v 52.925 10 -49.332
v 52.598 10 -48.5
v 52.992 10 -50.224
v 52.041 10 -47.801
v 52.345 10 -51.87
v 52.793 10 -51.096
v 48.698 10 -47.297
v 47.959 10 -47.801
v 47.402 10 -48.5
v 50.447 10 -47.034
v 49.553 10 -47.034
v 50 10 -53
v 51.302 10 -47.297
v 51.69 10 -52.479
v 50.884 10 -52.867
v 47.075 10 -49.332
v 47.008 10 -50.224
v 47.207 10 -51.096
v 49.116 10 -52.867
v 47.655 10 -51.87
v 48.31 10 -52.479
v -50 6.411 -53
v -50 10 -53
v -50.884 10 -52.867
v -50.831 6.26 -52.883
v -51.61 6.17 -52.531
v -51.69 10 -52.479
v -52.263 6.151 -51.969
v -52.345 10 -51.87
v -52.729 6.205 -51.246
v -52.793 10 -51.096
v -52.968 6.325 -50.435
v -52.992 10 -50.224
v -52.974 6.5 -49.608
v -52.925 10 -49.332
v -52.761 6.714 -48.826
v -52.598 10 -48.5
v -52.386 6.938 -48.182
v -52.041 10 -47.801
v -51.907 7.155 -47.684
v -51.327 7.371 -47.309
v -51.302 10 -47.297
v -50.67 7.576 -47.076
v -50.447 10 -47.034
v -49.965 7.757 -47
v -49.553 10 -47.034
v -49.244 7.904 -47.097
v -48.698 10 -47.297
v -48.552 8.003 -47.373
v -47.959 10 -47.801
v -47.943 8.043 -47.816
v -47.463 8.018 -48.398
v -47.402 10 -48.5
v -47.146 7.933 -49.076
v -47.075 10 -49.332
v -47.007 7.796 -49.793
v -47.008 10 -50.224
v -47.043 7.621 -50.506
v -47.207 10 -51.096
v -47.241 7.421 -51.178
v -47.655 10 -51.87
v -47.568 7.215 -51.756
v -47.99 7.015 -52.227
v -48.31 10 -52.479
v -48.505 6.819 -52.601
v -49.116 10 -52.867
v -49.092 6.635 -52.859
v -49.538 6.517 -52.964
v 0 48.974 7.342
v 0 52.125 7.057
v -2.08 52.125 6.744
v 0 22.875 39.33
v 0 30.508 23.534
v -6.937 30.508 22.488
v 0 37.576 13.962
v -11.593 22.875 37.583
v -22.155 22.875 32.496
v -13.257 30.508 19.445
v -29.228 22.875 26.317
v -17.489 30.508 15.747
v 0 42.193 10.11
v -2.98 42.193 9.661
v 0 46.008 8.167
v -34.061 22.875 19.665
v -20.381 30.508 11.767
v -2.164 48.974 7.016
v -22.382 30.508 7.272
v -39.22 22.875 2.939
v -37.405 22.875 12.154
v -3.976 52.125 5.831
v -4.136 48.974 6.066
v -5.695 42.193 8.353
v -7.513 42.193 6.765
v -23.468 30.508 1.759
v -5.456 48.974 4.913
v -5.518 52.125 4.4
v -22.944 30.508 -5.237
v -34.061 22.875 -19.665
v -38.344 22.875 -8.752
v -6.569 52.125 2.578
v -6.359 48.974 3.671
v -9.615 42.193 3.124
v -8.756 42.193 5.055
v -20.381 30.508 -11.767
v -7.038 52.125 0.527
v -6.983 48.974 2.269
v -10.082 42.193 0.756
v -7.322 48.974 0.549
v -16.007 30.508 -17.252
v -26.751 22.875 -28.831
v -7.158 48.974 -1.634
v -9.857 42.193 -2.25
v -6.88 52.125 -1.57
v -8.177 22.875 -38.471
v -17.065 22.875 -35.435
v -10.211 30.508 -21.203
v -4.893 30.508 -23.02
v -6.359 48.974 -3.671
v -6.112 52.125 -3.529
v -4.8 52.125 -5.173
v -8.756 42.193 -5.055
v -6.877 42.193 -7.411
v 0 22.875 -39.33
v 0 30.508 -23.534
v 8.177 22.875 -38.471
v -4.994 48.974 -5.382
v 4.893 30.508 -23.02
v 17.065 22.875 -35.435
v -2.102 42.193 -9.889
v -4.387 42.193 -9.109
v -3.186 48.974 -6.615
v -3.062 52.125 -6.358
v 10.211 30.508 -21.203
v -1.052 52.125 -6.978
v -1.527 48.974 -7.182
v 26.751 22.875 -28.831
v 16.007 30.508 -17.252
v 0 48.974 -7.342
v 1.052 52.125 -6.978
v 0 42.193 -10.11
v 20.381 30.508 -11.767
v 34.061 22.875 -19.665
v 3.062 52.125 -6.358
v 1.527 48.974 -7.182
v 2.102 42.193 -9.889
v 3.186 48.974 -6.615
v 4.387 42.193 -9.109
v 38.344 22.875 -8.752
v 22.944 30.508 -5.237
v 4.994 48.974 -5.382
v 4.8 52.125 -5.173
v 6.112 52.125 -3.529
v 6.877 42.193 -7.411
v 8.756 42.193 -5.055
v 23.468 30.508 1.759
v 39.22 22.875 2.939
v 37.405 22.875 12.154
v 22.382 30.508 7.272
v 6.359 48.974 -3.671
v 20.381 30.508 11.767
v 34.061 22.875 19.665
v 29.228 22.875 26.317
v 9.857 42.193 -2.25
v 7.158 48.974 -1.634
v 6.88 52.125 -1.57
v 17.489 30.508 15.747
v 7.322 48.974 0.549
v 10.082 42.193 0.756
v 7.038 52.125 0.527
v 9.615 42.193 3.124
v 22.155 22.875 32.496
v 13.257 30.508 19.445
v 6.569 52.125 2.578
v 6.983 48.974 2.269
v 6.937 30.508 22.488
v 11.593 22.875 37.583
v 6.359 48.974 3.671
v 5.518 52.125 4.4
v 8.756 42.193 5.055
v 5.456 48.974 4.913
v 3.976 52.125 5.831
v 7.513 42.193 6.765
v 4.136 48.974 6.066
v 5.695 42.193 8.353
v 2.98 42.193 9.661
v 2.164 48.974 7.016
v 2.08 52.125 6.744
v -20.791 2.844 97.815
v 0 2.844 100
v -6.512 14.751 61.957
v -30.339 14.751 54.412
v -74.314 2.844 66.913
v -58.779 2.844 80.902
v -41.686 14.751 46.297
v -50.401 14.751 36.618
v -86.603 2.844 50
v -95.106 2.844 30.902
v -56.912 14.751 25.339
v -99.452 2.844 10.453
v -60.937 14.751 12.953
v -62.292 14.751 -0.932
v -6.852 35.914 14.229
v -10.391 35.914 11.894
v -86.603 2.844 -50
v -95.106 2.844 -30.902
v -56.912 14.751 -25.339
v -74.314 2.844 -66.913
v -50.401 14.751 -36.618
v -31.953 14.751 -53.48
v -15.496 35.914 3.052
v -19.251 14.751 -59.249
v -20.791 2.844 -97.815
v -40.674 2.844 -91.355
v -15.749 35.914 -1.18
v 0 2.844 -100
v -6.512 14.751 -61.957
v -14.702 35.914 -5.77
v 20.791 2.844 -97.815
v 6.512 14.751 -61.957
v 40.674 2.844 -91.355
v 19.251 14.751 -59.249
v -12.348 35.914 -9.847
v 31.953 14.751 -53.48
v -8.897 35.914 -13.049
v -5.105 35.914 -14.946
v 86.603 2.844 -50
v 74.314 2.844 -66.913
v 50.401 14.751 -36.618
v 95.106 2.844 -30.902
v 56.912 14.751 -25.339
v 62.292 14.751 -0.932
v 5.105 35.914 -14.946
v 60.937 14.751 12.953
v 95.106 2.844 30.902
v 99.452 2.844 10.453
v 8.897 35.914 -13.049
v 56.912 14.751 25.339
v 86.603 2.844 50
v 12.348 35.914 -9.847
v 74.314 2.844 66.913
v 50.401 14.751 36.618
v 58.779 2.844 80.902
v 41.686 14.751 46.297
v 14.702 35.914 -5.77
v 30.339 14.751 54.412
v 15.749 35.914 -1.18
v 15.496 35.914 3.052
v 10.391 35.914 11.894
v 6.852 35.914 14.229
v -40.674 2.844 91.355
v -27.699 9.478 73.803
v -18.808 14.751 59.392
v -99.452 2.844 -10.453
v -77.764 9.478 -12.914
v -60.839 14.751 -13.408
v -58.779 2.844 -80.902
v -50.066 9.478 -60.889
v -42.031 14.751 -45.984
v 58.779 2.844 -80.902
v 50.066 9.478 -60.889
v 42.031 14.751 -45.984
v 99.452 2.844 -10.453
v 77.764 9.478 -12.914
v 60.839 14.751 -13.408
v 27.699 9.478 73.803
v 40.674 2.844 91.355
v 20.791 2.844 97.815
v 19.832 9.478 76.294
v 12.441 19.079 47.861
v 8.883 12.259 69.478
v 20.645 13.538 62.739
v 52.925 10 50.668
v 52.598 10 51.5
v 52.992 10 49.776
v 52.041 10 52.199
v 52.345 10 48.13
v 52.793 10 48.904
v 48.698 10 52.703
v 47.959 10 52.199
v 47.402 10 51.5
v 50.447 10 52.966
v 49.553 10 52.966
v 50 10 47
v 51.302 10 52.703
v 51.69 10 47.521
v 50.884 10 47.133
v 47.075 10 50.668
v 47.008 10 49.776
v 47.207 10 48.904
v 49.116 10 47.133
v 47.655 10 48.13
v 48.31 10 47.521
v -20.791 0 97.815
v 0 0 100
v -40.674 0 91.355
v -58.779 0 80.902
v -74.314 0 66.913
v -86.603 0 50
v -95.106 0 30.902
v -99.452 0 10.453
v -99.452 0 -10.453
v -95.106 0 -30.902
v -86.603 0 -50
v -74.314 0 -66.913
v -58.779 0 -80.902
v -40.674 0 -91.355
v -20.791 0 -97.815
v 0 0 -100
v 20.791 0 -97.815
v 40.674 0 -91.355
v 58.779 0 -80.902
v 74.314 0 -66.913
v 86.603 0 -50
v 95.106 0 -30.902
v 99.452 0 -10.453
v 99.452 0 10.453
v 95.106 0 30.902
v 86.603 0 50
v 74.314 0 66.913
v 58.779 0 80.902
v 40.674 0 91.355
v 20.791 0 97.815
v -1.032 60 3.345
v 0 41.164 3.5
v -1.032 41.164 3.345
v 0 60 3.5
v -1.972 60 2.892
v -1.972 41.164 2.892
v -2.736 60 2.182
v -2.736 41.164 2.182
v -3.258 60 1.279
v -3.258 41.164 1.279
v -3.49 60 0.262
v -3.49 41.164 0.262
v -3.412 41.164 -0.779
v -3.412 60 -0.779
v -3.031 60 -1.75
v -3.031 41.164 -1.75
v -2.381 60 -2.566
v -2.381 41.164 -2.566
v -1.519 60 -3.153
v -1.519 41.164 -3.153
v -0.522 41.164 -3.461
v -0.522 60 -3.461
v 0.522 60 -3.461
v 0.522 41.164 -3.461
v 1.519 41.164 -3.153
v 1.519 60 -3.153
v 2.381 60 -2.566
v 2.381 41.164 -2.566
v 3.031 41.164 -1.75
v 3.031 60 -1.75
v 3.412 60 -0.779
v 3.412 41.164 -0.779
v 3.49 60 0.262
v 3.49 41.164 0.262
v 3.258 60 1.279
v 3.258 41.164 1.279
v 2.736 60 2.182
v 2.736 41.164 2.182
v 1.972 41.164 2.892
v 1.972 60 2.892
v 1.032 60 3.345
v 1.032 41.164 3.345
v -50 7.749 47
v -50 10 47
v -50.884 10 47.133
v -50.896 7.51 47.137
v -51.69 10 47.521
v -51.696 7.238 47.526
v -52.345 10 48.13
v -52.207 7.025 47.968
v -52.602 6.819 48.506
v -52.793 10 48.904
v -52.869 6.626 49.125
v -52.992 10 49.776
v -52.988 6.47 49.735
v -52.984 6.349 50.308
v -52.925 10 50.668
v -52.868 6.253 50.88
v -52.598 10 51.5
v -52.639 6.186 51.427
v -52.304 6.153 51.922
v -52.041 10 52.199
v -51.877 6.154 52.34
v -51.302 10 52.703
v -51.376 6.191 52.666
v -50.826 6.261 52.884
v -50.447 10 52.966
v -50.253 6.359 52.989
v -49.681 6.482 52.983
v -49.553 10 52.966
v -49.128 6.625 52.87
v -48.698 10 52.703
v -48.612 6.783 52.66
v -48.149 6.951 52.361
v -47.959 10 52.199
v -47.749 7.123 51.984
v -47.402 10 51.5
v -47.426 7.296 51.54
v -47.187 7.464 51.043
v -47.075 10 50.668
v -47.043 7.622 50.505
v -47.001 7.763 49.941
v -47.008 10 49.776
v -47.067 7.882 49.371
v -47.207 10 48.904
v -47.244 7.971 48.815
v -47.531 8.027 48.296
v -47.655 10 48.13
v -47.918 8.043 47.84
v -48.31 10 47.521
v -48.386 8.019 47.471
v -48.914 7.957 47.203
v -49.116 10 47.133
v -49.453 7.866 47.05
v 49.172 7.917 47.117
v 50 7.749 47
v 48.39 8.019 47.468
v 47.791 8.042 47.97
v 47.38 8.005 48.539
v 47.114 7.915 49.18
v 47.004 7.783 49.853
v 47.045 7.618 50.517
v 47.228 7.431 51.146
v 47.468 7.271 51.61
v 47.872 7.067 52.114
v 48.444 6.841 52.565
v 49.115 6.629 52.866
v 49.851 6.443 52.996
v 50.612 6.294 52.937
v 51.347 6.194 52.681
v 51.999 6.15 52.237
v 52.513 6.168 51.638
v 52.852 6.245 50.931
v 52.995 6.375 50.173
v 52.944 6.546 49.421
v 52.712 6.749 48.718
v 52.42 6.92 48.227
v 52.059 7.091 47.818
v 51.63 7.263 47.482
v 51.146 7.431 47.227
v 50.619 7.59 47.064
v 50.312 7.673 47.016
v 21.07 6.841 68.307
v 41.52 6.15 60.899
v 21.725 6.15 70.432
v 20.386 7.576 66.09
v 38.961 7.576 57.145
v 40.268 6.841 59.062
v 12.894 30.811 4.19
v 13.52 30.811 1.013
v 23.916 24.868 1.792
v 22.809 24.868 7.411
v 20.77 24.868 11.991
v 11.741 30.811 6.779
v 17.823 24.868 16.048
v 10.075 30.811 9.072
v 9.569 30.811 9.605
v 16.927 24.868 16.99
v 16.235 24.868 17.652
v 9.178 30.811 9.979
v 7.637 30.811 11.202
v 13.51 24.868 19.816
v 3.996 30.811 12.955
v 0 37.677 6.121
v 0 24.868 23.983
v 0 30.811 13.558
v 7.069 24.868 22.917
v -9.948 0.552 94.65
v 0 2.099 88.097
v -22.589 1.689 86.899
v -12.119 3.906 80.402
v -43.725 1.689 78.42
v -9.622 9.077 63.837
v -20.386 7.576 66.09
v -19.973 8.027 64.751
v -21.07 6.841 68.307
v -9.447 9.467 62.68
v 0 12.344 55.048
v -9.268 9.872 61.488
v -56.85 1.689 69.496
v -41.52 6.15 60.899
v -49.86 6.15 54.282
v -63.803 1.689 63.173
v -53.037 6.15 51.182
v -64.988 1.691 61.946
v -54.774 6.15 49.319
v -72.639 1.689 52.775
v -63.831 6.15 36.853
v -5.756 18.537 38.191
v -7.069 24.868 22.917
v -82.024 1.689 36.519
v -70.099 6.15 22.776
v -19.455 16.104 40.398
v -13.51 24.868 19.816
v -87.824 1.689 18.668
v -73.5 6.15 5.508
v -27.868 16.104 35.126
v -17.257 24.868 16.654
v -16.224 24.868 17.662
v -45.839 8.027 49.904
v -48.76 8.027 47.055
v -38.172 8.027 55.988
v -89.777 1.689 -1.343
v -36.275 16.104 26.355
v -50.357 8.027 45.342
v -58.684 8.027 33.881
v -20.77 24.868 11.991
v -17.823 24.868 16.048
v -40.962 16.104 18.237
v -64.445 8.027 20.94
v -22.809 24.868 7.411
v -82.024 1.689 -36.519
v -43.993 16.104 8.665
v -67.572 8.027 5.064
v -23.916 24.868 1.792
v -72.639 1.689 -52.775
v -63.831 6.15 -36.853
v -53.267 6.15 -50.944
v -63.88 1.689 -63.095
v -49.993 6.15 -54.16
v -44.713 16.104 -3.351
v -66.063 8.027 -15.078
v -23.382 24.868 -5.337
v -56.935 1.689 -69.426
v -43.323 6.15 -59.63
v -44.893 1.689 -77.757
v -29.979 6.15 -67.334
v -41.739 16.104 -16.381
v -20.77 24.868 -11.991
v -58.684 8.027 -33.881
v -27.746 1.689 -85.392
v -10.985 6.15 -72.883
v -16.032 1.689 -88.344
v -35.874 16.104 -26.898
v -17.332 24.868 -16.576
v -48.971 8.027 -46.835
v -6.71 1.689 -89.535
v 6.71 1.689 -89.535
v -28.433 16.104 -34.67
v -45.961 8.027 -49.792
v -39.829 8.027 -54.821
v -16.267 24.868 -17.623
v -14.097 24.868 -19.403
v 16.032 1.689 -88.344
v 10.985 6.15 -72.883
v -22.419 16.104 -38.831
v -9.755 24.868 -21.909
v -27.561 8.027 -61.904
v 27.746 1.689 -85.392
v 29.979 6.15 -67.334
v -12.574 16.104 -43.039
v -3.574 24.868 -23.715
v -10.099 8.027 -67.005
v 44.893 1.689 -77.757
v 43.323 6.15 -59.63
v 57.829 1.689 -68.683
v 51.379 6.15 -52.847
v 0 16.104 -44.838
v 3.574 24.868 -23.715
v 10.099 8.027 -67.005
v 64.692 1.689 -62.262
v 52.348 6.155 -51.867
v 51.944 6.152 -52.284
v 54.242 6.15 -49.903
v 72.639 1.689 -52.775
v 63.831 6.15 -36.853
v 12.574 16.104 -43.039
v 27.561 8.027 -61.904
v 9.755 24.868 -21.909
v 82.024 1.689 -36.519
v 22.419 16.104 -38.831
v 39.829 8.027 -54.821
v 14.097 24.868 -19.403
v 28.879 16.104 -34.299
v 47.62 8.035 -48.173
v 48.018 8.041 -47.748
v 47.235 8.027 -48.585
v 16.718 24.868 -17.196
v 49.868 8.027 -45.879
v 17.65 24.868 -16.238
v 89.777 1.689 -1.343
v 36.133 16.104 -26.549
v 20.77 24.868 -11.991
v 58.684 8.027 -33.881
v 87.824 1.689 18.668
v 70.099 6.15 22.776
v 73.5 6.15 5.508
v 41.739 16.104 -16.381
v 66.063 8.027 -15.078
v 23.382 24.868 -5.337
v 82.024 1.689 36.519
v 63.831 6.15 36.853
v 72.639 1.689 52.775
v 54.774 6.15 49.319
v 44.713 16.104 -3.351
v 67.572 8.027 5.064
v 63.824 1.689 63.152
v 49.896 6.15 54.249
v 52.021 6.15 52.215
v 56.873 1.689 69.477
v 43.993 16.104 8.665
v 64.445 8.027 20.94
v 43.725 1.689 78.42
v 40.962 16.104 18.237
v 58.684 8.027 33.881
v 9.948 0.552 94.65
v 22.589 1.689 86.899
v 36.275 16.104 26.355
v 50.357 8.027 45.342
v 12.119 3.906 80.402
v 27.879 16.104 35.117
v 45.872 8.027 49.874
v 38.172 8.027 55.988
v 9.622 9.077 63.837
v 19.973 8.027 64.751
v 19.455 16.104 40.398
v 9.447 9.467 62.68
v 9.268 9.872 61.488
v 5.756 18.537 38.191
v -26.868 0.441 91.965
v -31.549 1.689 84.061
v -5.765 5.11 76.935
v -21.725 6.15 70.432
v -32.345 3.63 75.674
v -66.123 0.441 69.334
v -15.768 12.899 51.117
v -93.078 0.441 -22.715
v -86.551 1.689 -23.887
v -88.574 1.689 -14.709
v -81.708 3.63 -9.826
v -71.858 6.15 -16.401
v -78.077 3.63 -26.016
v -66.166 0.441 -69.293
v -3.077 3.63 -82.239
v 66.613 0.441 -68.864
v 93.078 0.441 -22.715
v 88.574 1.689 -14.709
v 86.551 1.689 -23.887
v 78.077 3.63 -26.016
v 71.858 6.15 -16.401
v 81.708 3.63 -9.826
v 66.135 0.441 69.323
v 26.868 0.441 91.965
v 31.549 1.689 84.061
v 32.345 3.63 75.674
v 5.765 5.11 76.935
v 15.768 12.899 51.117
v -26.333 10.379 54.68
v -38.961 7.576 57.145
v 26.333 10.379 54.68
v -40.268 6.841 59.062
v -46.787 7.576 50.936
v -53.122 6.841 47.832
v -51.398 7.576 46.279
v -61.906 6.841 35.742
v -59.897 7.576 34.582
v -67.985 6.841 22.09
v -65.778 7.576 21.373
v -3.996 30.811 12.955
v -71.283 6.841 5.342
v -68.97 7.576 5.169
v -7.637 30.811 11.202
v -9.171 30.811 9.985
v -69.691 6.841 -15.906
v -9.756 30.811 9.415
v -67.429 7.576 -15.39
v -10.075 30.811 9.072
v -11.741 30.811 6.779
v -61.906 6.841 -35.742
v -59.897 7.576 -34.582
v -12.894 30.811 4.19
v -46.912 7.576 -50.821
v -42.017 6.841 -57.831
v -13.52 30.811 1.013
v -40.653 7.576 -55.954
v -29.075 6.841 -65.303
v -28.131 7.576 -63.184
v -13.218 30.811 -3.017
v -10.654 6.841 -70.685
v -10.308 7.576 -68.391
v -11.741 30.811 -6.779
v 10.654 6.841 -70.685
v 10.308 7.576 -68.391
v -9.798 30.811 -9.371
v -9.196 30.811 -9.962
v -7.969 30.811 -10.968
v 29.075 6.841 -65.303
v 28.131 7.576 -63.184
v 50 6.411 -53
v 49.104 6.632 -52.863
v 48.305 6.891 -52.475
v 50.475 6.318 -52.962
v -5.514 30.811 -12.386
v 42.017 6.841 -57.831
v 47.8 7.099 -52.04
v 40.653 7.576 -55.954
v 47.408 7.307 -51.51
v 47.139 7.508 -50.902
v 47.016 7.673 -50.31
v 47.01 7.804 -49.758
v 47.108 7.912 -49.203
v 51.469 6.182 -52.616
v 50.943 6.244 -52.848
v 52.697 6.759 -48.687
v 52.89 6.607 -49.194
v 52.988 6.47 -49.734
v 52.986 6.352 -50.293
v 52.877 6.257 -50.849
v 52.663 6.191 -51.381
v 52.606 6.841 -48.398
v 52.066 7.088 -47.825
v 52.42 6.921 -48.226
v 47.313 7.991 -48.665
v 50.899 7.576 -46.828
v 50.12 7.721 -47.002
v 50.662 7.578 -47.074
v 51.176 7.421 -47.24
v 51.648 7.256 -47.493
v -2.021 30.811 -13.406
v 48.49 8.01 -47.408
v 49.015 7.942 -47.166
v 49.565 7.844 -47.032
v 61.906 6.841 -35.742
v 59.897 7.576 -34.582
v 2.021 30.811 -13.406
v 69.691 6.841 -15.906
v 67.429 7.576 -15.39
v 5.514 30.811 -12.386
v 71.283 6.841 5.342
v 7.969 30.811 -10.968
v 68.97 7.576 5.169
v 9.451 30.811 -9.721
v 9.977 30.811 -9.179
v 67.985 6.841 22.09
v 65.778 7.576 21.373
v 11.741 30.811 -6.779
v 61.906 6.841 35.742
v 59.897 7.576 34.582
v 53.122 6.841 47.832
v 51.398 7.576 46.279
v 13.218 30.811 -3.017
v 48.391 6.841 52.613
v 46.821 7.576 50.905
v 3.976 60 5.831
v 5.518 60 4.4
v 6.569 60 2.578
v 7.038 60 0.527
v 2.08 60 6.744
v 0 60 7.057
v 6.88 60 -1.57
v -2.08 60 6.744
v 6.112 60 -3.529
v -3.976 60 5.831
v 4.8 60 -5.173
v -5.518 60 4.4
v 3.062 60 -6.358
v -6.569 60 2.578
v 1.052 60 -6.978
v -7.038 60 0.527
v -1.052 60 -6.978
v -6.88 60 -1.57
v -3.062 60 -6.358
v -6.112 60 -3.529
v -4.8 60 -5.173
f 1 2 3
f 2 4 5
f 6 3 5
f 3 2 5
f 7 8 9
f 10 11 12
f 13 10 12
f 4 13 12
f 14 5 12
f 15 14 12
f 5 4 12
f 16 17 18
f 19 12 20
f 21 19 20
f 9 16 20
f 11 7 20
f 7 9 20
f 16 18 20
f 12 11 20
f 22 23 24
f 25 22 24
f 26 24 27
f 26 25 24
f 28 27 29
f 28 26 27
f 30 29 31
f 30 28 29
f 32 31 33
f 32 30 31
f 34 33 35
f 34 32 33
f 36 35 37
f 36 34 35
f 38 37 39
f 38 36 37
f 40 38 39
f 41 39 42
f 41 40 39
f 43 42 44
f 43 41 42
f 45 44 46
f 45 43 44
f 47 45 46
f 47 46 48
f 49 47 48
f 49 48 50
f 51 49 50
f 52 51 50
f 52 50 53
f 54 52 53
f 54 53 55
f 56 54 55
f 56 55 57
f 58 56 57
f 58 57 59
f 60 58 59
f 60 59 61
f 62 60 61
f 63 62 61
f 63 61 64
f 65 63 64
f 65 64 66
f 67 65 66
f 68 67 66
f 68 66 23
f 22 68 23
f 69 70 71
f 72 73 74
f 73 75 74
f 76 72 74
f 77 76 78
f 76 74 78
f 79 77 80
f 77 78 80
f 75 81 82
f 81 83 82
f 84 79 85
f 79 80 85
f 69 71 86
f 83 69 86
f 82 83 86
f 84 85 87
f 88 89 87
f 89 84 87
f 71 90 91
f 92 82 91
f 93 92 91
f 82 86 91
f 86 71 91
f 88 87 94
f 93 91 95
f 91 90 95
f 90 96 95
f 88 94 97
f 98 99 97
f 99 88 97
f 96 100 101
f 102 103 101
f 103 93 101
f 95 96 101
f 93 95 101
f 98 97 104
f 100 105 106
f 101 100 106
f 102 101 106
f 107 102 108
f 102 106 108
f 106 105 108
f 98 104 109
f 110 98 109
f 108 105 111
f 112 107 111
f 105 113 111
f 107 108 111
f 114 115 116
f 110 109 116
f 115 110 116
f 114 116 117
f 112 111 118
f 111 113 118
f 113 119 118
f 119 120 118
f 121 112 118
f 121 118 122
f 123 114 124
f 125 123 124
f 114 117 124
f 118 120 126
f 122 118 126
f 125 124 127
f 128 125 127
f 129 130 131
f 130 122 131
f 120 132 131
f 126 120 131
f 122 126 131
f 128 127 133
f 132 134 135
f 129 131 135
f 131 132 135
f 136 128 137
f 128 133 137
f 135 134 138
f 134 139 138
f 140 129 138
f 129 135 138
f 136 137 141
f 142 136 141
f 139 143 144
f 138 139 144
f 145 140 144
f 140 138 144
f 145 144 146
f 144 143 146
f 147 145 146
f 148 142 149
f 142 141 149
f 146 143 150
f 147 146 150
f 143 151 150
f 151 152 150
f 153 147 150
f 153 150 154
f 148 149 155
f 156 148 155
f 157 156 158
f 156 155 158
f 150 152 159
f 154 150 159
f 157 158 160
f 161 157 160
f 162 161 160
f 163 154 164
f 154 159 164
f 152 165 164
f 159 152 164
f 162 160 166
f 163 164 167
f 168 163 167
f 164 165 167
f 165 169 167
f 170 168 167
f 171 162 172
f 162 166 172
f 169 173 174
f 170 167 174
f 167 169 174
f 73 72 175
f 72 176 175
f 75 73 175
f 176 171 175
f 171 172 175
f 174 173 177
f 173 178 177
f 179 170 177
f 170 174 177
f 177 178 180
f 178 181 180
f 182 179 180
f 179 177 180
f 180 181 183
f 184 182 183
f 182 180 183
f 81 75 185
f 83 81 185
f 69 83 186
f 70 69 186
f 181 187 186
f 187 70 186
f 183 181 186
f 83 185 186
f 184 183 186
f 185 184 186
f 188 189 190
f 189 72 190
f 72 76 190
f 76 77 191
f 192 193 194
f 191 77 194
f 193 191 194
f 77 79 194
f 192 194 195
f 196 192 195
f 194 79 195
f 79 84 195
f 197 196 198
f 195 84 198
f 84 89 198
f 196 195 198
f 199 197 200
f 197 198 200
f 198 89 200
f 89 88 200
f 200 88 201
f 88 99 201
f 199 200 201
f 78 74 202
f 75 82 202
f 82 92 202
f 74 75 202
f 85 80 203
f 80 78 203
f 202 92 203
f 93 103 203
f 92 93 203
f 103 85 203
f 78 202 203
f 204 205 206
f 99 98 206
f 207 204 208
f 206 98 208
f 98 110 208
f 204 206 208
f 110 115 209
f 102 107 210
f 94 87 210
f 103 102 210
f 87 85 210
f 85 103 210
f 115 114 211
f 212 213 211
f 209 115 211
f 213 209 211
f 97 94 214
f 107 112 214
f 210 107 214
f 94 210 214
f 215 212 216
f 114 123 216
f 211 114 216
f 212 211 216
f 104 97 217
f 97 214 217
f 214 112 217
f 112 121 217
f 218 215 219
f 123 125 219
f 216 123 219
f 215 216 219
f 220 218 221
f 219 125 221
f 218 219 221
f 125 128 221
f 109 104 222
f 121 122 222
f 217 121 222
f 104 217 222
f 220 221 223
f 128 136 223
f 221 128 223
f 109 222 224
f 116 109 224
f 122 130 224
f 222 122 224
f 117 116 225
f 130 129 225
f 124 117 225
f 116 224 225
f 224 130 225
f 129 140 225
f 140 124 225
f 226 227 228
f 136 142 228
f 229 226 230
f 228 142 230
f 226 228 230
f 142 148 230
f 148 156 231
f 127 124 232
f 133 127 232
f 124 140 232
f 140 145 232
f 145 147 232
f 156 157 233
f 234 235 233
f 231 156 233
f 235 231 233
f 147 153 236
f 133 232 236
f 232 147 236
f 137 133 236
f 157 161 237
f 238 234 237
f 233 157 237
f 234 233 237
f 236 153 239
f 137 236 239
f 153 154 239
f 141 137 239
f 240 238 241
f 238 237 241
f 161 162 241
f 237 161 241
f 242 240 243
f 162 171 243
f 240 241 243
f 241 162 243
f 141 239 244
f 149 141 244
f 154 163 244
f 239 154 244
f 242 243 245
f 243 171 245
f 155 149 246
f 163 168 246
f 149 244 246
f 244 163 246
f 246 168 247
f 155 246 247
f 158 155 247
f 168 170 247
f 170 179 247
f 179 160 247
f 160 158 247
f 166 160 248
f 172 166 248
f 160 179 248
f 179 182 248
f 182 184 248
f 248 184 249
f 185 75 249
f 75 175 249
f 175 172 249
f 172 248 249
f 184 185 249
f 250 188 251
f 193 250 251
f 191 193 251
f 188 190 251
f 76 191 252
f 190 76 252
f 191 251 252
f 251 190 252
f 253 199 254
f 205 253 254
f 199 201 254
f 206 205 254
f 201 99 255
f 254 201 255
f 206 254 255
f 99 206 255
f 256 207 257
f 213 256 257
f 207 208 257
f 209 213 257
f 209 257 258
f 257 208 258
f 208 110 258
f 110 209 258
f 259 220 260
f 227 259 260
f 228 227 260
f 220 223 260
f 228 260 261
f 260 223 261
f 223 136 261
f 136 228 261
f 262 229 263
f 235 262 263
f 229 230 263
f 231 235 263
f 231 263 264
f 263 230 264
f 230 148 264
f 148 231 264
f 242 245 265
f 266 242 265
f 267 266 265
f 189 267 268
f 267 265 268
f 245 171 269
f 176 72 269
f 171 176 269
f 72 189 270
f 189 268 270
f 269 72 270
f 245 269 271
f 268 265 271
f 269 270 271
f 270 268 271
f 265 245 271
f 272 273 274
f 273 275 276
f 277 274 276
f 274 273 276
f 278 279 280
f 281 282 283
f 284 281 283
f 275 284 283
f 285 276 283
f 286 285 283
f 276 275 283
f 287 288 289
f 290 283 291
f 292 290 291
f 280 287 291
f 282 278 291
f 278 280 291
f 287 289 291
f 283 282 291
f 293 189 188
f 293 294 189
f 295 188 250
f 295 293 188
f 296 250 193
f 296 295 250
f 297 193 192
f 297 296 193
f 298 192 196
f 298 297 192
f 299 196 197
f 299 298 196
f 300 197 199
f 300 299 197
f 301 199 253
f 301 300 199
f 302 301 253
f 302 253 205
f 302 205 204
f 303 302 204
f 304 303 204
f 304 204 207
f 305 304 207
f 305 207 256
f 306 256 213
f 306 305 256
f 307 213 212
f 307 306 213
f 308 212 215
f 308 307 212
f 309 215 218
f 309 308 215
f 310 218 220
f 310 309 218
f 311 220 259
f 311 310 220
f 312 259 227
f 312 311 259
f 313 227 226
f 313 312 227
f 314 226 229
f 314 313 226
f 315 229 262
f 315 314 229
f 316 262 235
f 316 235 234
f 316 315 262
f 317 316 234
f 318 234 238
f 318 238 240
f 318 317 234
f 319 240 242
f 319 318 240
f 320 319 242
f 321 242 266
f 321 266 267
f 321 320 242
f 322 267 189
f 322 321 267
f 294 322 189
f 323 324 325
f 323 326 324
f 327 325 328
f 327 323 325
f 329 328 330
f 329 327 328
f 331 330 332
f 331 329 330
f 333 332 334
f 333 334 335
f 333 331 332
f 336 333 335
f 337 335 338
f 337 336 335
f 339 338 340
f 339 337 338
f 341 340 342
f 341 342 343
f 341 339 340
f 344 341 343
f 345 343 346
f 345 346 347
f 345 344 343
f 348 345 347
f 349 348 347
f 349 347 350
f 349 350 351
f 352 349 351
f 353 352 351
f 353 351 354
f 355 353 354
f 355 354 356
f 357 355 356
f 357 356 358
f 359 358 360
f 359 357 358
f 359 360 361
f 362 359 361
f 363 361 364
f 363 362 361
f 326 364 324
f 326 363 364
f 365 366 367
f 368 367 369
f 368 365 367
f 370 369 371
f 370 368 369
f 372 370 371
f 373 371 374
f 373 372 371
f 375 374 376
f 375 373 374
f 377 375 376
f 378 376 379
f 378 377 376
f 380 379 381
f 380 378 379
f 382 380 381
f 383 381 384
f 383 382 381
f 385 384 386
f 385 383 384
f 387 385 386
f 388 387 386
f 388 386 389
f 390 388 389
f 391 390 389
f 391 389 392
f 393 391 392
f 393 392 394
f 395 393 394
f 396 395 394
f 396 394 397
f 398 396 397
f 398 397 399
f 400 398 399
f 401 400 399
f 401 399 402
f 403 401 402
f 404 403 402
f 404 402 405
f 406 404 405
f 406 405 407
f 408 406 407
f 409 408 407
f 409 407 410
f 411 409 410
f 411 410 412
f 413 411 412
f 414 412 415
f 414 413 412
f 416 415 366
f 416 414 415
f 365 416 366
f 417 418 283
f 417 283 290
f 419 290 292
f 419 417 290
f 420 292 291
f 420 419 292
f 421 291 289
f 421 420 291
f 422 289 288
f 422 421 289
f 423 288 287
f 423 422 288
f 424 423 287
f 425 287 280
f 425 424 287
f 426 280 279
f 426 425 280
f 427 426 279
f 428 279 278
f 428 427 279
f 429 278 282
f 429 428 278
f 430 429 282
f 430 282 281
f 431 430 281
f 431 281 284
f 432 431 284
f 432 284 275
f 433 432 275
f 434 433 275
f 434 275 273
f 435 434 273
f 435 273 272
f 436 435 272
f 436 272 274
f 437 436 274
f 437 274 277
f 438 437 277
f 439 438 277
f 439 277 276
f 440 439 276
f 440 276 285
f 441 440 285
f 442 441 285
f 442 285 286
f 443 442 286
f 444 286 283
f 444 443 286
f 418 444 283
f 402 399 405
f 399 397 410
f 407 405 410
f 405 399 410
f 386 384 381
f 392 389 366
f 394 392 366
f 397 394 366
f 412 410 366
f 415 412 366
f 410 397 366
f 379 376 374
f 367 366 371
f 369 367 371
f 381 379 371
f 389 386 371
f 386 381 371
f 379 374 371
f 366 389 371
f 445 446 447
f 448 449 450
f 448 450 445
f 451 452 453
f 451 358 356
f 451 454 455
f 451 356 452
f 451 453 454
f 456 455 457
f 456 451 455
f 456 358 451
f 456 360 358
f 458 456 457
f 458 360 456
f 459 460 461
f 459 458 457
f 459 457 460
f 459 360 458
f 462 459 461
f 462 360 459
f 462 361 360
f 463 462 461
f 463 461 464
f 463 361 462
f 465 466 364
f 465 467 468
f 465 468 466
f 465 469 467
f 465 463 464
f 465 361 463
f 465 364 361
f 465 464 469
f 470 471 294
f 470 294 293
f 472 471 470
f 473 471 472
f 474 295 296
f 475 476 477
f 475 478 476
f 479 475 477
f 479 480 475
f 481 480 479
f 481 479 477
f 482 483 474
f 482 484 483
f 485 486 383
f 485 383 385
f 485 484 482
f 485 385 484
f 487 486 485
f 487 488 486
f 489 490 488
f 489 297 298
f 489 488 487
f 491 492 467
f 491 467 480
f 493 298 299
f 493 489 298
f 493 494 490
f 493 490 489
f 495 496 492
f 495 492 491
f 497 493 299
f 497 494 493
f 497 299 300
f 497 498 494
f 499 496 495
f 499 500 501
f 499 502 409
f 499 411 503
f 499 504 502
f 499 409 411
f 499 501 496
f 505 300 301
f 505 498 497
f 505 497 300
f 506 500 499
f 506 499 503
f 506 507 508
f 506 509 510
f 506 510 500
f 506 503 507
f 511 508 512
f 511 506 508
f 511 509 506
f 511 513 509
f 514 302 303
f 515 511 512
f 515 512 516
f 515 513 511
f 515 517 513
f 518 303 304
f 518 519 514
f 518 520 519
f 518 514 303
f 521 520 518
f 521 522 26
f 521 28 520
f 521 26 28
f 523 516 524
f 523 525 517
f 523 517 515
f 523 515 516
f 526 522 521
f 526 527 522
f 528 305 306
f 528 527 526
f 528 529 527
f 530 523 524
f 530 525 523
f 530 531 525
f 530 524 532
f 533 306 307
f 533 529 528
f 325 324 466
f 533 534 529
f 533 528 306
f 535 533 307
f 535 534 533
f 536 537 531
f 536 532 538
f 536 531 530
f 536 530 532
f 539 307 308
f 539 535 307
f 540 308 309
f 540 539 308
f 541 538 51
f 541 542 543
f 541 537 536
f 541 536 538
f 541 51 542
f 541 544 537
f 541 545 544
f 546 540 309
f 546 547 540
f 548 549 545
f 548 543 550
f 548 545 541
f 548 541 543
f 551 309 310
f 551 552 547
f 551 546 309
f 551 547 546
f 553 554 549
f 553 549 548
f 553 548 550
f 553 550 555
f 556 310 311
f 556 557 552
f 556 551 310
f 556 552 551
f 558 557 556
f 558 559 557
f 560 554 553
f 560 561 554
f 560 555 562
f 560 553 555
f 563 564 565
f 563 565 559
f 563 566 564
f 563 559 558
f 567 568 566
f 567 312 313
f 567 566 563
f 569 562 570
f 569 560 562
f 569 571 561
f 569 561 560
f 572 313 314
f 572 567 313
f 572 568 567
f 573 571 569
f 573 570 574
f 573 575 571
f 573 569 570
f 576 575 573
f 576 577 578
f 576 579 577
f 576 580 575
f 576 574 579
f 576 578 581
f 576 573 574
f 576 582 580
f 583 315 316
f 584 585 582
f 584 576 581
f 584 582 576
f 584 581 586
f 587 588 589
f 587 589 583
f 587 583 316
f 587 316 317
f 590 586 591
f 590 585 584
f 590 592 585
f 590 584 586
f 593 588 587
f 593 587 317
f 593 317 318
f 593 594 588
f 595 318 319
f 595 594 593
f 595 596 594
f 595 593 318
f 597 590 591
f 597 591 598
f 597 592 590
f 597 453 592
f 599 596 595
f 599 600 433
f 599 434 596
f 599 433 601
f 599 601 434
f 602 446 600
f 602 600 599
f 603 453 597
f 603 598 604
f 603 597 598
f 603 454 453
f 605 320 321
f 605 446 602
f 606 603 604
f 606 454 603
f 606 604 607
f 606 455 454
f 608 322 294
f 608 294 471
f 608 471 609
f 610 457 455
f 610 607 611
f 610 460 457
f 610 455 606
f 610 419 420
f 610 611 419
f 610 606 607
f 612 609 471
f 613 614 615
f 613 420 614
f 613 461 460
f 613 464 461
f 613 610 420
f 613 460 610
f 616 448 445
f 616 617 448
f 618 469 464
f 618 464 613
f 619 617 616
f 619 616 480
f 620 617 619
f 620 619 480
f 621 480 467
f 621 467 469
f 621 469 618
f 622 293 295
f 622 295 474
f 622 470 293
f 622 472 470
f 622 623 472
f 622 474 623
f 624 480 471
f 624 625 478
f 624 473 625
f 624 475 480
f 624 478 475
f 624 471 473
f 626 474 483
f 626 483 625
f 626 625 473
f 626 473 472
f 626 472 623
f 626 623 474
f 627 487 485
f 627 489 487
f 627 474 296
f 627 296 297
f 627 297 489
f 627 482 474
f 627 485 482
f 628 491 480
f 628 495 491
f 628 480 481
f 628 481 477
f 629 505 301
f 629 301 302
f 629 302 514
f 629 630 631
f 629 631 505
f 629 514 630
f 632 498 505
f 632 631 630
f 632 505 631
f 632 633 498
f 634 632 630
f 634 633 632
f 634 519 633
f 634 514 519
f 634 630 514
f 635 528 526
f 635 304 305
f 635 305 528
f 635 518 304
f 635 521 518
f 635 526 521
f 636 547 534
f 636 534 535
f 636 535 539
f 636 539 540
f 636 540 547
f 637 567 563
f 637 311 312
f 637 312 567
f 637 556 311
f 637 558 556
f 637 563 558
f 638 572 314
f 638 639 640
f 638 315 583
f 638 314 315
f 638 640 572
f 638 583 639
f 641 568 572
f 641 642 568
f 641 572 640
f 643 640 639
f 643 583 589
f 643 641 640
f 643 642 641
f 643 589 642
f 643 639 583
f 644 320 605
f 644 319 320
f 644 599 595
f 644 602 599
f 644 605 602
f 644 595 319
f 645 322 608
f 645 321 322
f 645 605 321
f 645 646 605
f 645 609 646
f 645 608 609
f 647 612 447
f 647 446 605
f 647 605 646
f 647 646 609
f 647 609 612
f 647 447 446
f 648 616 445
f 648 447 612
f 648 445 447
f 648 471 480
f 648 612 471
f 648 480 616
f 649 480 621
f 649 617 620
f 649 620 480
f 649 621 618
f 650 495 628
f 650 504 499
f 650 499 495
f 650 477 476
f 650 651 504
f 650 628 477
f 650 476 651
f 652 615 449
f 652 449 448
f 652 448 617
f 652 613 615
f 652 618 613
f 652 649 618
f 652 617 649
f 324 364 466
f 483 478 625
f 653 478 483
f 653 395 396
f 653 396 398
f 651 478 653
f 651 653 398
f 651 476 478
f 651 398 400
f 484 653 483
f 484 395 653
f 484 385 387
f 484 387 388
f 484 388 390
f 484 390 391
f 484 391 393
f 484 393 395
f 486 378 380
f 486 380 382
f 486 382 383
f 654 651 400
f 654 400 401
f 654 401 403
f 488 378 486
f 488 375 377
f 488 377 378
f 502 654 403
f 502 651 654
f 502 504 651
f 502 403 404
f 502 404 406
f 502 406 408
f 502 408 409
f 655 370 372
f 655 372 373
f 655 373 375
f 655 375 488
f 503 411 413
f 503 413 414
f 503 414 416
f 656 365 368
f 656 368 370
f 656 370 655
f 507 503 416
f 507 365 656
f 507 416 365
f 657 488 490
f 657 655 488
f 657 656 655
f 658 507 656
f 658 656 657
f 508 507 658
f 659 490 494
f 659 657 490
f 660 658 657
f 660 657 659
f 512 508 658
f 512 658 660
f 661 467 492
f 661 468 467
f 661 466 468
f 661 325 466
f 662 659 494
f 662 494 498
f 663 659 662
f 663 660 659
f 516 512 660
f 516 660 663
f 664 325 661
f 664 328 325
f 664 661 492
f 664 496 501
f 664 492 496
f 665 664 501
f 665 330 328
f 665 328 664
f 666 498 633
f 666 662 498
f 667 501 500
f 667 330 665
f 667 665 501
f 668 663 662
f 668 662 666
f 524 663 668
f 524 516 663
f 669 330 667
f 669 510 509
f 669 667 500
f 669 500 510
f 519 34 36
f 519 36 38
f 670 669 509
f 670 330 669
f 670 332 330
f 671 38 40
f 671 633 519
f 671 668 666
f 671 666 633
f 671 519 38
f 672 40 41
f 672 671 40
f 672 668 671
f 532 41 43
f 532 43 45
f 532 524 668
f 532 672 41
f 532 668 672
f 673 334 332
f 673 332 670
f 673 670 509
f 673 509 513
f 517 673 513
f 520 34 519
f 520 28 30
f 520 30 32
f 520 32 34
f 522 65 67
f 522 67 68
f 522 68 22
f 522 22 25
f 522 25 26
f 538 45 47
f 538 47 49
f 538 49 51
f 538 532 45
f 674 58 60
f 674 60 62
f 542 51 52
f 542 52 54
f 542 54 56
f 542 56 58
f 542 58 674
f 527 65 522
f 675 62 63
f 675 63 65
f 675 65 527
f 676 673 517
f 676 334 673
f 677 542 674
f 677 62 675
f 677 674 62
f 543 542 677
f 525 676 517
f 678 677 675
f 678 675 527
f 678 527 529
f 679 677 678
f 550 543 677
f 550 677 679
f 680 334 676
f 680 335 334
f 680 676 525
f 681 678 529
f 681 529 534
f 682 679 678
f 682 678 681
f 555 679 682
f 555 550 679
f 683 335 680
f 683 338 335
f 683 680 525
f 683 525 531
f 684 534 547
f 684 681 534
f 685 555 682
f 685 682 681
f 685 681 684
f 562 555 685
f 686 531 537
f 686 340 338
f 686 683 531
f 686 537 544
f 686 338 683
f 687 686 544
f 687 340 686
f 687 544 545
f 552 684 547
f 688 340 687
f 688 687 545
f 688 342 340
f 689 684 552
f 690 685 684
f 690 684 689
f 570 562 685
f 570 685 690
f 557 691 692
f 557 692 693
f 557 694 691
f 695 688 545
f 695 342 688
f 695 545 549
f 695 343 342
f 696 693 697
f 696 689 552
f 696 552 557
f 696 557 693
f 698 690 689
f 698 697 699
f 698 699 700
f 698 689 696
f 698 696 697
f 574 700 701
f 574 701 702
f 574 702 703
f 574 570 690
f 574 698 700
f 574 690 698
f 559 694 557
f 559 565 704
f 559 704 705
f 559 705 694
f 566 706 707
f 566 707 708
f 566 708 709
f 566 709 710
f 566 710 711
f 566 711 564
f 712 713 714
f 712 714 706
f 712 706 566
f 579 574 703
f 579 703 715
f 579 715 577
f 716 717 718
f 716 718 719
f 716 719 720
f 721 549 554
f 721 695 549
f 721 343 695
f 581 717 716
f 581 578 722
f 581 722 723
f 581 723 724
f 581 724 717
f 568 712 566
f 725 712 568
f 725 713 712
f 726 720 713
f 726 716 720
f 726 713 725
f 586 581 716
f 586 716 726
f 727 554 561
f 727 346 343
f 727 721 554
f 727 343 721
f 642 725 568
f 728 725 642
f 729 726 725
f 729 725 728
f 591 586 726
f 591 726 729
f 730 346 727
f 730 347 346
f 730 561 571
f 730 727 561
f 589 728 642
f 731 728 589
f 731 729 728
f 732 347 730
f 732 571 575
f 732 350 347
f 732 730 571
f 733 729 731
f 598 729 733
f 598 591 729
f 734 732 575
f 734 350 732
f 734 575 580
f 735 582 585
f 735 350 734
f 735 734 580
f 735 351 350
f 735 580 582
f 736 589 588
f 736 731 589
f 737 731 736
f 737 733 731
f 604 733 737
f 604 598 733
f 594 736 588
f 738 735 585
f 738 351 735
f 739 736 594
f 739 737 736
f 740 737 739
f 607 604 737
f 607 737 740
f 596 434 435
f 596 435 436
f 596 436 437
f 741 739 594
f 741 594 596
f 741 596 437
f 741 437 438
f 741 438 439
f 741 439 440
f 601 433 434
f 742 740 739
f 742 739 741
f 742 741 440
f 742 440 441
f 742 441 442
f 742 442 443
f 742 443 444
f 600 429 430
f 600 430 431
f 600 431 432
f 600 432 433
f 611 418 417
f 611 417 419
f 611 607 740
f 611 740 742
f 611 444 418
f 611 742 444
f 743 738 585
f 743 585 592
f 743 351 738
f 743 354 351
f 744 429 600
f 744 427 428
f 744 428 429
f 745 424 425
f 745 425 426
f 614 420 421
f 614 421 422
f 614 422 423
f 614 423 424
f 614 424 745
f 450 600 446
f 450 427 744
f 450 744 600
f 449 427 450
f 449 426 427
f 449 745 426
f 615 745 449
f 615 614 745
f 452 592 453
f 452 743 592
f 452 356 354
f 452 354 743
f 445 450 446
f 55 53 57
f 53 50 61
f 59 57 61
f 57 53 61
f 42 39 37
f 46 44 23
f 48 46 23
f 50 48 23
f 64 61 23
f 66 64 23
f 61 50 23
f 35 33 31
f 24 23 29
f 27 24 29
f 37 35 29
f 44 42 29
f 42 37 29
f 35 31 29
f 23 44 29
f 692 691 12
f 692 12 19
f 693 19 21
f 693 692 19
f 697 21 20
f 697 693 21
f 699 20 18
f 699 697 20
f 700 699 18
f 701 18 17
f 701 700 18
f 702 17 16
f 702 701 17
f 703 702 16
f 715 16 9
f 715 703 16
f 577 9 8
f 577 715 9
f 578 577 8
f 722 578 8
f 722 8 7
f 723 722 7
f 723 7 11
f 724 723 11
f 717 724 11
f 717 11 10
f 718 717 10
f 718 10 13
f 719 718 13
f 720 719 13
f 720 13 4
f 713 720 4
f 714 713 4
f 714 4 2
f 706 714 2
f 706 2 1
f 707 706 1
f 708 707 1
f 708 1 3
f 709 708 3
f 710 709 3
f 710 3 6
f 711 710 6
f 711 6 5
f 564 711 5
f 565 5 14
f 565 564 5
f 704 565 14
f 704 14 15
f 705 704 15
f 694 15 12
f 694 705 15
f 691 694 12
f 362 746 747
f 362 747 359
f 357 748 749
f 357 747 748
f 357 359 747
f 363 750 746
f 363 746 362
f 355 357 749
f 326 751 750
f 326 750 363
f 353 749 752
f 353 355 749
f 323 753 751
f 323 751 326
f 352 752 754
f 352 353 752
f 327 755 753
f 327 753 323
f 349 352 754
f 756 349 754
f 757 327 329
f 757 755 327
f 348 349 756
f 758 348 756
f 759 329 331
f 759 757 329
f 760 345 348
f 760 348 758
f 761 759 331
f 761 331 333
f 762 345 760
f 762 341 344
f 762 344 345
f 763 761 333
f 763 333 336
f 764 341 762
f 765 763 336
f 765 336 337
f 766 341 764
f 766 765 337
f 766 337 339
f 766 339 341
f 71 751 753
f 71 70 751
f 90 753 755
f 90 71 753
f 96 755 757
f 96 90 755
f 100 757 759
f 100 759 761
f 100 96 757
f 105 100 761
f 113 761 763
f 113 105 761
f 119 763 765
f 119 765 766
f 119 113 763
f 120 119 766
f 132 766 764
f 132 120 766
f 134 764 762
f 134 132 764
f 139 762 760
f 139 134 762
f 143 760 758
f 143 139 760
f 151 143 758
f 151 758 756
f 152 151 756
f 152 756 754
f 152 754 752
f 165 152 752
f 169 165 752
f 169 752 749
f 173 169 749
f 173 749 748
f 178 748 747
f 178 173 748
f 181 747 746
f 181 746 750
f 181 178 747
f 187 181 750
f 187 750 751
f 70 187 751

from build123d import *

# Parameters (mm, degrees)
SKETCH2_R          = 3
CUT_EXTRUDE2_DEPTH = 10


with BuildPart() as part:
    # Sketch1 → Revolve1 (revolve)
    with BuildSketch(Plane.XY, mode=Mode.PRIVATE) as revolve1_sk:
        with BuildLine():
            Line((100, 2.844477336), (100, 0))
            add(Edge.make_bspline(
                [(100, 0), (90.312762525, 0), (43.119706996, 15.073582884), (9.43857005, 32.11606328), (3.5, 40.928765801), (3.5, 41.163912301)],
                knots=[0, 0, 0, 0, 0.641468737, 0.741468737, 1, 1, 1, 1], degree=3))
            Line((3.5, 41.163912301), (3.5, 60))
            Line((3.5, 60), (7.057288072, 60))
            Line((7.057288072, 60), (7.057288072, 52.125008745))
            add(Edge.make_bspline(
                [(100, 2.844477336), (58.263448469, 15.906011625), (27.953606397, 25.195125562), (7.057288072, 41.21441144), (7.057288072, 52.125008745)],
                knots=[0, 0, 0, 0, 0.525870122, 1, 1, 1, 1], degree=3))
        make_face()
    revolve(revolve1_sk.sketch.rotate(Axis((0, 82.920033306, 0), (0, -1, 0)), 90), axis=Axis((0, 82.920033306, 0), (0, -1, 0)))

    # Sketch2 → Cut-Extrude2 (cut)
    with BuildSketch(Plane(origin=(0, 0, 0), x_dir=(1, 0, 0), z_dir=(0, 1, 0))):
        with Locations(Location((-50, -50, 0), (0, 0, 90))):
            Circle(SKETCH2_R)
        with Locations(Location((50, -50, 0), (0, 0, 90))):
            Circle(SKETCH2_R)
        with Locations(Location((50, 50, 0), (0, 0, 90))):
            Circle(SKETCH2_R)
        with Locations(Location((-50, 50, 0), (0, 0, 90))):
            Circle(SKETCH2_R)
    extrude(amount=CUT_EXTRUDE2_DEPTH, mode=Mode.SUBTRACT)


solid = part.part
